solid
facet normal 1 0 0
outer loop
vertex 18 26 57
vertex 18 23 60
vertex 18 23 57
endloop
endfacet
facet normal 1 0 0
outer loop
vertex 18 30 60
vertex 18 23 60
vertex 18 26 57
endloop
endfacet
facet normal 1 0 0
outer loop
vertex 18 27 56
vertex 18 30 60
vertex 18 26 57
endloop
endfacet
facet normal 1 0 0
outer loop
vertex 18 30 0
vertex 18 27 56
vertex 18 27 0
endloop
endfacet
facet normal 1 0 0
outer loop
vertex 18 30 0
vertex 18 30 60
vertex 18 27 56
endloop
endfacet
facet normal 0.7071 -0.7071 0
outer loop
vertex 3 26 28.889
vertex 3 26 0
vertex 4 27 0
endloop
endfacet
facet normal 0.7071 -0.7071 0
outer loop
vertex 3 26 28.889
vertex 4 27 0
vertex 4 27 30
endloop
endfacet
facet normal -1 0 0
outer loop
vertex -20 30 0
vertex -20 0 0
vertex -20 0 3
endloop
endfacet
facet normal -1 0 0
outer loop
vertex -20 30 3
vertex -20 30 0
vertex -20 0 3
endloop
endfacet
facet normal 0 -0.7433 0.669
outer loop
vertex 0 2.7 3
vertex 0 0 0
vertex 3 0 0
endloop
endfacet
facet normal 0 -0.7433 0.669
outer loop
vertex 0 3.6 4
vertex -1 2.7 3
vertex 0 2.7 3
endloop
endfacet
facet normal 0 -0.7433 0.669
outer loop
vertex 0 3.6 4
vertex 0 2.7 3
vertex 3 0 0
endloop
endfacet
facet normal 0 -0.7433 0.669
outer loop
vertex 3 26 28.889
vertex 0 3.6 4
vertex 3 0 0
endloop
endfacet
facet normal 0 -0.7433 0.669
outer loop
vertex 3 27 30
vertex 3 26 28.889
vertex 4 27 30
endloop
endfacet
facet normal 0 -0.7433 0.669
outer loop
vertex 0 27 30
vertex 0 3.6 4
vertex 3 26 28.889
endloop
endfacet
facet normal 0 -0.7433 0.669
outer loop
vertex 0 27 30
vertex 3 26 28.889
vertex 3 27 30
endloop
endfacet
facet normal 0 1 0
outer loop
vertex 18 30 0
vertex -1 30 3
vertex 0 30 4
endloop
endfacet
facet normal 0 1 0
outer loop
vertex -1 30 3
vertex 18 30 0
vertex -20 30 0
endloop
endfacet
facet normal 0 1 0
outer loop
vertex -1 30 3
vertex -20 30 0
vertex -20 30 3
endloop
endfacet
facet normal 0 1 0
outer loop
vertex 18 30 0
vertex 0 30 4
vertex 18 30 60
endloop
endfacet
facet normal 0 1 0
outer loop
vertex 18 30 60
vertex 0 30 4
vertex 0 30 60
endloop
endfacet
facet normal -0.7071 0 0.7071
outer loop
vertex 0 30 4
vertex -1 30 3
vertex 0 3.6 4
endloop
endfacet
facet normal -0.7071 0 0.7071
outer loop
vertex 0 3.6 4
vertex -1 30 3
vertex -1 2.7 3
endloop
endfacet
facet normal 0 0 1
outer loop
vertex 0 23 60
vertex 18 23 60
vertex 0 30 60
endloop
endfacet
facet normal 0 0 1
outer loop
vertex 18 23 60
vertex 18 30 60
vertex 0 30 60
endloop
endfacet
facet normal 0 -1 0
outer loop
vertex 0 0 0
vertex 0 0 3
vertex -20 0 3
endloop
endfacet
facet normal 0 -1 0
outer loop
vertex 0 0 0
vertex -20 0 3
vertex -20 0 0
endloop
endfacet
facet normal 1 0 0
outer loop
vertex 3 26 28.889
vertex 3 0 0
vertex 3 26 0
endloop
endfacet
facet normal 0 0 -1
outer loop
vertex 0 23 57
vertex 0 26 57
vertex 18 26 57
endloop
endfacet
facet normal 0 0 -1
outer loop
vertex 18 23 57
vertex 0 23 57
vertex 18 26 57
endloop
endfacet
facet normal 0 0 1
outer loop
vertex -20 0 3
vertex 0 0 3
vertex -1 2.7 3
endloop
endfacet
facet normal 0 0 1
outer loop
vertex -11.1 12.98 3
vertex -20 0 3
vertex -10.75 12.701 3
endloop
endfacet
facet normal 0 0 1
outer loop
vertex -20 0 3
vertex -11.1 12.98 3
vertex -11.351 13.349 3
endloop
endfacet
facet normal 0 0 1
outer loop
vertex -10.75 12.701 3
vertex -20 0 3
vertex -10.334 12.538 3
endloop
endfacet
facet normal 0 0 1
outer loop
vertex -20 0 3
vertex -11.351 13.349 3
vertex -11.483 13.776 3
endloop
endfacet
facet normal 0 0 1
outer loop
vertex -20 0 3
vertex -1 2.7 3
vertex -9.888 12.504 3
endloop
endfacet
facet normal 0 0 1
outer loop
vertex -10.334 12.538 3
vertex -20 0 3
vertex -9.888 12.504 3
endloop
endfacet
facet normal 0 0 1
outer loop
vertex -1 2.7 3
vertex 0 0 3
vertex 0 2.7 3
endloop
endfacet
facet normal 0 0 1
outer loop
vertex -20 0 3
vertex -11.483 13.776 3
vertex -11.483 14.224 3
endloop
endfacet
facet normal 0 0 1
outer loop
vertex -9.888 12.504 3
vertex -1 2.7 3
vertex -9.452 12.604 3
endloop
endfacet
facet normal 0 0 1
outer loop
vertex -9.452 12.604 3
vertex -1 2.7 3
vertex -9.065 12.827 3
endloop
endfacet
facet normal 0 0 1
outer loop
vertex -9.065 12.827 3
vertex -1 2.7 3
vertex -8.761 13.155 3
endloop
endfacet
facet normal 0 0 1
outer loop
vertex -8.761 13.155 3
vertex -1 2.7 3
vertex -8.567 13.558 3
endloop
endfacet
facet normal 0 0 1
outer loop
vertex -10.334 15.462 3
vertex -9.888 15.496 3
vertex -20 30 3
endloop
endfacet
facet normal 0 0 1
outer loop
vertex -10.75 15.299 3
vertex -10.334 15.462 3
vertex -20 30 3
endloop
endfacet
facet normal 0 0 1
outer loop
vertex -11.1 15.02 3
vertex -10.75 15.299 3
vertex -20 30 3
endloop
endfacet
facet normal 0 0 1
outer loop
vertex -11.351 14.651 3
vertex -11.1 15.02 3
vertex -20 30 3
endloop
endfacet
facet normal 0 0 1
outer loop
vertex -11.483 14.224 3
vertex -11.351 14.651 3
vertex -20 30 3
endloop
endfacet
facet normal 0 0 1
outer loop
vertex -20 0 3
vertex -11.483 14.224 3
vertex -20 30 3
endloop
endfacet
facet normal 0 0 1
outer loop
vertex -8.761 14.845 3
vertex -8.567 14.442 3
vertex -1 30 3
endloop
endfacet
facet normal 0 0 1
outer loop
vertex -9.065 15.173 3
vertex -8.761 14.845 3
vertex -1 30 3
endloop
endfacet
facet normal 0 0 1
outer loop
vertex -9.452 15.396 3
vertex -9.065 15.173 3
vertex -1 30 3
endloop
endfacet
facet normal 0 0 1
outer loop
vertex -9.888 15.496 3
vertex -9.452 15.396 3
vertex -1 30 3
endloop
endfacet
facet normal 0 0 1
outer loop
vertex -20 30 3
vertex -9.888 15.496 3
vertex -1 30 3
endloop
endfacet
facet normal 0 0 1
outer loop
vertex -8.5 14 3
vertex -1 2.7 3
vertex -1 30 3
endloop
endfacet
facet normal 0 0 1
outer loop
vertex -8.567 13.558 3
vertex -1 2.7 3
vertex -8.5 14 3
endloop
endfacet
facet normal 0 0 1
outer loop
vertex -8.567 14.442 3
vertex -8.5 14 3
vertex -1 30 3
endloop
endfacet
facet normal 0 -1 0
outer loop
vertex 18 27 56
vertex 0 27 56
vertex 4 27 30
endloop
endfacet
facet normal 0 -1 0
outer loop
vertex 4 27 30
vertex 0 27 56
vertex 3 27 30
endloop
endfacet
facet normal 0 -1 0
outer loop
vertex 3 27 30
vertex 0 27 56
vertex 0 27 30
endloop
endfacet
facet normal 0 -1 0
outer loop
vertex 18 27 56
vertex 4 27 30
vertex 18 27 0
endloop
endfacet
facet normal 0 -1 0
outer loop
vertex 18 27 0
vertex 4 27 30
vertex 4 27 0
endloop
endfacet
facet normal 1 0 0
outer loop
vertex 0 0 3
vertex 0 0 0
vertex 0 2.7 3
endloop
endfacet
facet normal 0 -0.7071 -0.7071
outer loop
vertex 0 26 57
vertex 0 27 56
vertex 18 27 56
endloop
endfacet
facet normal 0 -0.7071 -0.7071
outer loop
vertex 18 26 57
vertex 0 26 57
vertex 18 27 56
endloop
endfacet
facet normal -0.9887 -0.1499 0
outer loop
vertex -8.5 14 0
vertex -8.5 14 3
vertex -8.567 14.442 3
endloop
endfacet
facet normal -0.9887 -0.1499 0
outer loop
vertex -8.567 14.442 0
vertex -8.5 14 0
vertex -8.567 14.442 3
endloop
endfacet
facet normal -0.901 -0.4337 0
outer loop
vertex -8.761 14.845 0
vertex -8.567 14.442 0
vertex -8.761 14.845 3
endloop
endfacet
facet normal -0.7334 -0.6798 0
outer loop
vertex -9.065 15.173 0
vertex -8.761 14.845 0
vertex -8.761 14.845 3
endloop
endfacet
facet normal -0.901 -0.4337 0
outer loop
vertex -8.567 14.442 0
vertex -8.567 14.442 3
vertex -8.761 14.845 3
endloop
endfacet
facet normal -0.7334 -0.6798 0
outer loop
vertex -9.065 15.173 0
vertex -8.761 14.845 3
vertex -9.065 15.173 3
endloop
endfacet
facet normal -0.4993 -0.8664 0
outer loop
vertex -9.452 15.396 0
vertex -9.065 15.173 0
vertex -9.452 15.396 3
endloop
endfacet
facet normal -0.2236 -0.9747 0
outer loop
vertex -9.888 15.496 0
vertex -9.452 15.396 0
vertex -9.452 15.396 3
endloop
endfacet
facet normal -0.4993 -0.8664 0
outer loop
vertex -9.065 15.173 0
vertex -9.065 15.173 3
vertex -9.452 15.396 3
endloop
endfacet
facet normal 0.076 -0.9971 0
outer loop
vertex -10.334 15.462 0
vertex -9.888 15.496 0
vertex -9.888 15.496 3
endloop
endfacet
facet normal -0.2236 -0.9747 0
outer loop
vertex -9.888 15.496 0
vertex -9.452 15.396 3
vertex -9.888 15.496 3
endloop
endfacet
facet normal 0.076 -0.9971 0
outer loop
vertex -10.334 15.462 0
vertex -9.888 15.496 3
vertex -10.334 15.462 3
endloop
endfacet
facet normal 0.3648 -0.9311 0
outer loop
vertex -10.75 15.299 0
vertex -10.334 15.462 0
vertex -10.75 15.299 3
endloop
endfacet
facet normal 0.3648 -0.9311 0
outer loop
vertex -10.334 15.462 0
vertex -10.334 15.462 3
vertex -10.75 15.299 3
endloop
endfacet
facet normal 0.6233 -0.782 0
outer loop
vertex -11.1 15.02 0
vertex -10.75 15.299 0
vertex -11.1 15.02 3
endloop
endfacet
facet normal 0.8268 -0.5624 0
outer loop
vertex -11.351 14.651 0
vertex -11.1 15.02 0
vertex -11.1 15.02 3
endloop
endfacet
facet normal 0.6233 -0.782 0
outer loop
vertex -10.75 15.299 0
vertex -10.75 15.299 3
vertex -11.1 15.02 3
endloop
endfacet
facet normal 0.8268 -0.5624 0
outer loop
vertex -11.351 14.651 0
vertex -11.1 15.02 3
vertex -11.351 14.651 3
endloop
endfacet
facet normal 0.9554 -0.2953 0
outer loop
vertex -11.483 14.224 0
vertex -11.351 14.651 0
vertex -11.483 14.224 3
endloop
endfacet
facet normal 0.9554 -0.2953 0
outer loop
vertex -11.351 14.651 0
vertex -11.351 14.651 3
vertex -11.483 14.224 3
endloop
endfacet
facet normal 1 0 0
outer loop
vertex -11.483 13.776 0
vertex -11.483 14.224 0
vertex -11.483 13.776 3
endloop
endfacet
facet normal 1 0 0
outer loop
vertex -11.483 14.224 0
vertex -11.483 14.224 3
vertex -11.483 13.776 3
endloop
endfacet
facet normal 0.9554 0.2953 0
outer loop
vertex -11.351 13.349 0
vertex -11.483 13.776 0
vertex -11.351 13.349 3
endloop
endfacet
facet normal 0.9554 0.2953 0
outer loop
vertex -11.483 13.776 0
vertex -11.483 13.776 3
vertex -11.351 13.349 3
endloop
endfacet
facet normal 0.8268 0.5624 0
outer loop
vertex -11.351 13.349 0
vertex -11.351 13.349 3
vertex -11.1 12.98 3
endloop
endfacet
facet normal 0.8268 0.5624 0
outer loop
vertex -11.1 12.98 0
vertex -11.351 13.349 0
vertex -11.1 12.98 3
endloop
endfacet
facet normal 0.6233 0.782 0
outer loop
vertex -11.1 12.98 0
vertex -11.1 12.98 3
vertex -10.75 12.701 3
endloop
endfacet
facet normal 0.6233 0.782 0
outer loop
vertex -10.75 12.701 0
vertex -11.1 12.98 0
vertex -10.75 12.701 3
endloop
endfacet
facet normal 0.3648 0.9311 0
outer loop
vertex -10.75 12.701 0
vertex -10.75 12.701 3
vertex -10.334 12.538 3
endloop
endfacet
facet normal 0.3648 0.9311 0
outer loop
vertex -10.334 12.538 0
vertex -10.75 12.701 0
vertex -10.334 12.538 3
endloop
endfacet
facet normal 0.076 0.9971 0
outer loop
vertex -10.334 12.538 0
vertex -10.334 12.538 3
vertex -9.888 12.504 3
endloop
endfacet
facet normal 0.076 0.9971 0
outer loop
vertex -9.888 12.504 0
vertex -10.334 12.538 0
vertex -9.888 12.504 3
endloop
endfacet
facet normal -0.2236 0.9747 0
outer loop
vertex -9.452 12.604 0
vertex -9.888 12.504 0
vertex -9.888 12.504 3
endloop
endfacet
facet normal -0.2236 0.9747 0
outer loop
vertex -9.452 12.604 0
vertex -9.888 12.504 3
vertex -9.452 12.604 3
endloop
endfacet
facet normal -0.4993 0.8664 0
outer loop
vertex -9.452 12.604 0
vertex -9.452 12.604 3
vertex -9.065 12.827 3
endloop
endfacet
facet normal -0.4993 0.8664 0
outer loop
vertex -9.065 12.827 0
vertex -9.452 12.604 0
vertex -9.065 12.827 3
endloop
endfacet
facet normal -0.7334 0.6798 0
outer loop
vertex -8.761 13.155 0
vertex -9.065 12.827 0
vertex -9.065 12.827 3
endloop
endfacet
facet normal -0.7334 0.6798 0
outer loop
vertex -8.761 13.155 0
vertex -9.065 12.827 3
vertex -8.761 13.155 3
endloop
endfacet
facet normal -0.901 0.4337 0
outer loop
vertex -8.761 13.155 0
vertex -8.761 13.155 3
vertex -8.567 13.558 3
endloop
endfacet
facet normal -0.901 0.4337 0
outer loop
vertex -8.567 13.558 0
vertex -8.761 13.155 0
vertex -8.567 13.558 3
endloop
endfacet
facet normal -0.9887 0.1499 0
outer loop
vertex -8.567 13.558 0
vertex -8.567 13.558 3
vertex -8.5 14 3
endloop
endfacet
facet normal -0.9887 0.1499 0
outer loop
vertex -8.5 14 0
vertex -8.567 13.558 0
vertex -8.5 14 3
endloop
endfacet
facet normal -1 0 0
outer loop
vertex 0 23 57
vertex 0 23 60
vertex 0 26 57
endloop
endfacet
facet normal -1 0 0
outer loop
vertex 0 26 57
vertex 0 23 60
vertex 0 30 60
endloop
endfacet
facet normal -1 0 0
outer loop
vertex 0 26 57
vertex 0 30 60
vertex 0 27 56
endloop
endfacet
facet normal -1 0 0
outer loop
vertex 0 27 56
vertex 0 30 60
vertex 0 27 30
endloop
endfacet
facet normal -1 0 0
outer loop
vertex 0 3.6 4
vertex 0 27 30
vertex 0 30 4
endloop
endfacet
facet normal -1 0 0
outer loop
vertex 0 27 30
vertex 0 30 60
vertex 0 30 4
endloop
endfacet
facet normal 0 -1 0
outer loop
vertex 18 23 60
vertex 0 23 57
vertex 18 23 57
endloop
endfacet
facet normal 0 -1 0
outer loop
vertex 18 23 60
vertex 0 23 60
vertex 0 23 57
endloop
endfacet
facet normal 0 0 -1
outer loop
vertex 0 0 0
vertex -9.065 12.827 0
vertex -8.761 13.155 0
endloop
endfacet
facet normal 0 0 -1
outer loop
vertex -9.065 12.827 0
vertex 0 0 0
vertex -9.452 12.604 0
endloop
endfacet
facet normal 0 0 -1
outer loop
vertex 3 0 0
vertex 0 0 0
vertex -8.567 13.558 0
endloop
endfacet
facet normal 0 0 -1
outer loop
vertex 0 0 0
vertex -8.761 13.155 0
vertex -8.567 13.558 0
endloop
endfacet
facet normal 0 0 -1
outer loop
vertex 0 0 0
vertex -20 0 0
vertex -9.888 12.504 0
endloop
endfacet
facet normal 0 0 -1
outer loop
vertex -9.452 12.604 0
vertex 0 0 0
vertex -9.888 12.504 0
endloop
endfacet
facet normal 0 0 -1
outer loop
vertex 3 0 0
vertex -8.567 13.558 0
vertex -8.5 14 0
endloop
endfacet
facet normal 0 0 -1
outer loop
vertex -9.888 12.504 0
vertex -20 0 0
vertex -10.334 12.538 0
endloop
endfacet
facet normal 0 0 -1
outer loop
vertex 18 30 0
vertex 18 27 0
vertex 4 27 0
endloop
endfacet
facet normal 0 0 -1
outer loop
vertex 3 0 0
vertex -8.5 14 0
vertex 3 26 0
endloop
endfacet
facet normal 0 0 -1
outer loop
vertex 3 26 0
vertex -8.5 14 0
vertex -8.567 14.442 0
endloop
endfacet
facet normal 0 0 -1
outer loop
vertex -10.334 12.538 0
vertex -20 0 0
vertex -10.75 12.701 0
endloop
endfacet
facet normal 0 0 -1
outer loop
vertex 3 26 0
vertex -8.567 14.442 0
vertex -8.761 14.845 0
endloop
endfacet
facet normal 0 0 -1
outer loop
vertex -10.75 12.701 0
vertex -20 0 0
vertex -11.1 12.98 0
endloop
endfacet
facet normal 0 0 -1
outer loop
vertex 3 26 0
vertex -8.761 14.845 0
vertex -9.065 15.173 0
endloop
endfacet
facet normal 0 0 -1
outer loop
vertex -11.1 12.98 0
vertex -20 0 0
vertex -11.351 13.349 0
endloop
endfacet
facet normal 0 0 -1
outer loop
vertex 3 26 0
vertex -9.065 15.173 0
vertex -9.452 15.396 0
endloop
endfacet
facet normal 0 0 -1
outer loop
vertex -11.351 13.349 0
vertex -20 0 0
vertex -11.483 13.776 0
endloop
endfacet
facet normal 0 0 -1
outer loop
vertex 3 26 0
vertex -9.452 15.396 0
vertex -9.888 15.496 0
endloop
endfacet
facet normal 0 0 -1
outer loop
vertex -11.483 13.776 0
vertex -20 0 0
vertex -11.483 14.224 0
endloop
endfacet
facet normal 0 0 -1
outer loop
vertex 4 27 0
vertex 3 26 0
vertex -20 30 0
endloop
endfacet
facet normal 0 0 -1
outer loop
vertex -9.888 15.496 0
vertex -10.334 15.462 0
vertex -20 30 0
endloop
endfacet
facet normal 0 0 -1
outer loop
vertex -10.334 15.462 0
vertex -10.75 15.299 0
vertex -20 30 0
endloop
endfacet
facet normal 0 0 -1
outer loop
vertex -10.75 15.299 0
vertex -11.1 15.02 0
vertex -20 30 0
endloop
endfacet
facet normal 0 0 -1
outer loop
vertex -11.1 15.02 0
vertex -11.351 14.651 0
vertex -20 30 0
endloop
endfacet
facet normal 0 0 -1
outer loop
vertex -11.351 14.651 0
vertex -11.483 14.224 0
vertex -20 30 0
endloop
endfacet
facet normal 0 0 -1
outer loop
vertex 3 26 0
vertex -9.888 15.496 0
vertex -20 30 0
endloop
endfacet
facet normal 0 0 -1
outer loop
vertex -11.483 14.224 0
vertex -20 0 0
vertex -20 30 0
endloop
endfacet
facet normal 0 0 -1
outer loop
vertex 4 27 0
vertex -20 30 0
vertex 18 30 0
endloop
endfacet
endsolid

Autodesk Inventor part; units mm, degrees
ref_plane "YZ Plane" through (0, 0, 0) normal (1, 0, 0) x (0, 1, 0)
ref_plane "XZ Plane" through (0, 0, 0) normal (0, 1, 0) x (-1, 0, 0)
ref_plane "XY Plane" through (0, 0, 0) normal (0, 0, 1) x (1, 0, 0)
sketch "Sketch1" plane through (0, 0, 0) normal (1, 0, 0) x (0, 1, 0)
  line L0 (0, 0) -> (30, 0)
  line L1 (30, 0) -> (30, 30)
  line L2 (30, 30) -> (0, 30)
  line L3 (0, 30) -> (0, 0)
  line L4 (0, 0) -> (27, 30)
  dimension "d0" = 30
  dimension "d1" = 30
  dimension "d24" = 3
extrude "Extrusion1" add sketch "Sketch1" along normal blind 3 contours L4 L2 L1 L0
sketch "Sketch2" plane through (0, 0, 0) normal (-1, 0, 0) x (0, 0, 1)
  line L0 (30, 0) -> (0, 0) projected
  line L1 (0, 0) -> (3, 0)
  line L2 (3, 0) -> (3, 30)
  line L3 (3, 30) -> (0, 30)
  line L4 (0, 30) -> (0, 0)
  line L5 (0, 30) -> (30, 30) projected
  dimension "d4" = 3
extrude "Extrusion2" add sketch "Sketch2" along normal blind 20
sketch "Sketch3" plane through (0, 0, 3) normal (0, 0, 1) x (1, 0, 0)
  circle A0 centre (-10, 14) radius 1.5
  line L0 (0, 30) -> (-20, 30) projected
  line L1 (0, 0) -> (-20, 0) projected
  line L2 (-20, 0) -> (-20, 30) projected
  line L3 (0, 30) -> (0, 0) projected
  dimension "d7" = 3
  dimension "d8" = 16
  dimension "d10" = 10
  dimension "d11" = 10
extrude "Extrusion3" cut sketch "Sketch3" against normal through all contours A0
sketch "Sketch4" plane through (3, 0, 0) normal (1, 0, 0) x (0, 0, -1)
  line L0 (0, 0) -> (0, 30) projected
  line L1 (0, 30) -> (-60, 30)
  line L2 (-60, 30) -> (-60, 27)
  line L3 (-60, 27) -> (0, 27)
  line L4 (0, 27) -> (0, 30)
  point P0 (0, 27)
  dimension "d17" = 3
  dimension "d18" = 60
extrude "Extrusion4" add sketch "Sketch4" along normal blind 15 and the other way blind 3
sketch "Sketch5" plane through (3, 27, 0) normal (0, -1, 0) x (1, 0, 0)
  line L0 (15, 60) -> (15, 0) projected
  line L1 (15, 60) -> (-3, 60)
  line L2 (-3, 60) -> (-3, 57)
  line L3 (-3, 57) -> (15, 57)
  line L4 (15, 57) -> (15, 60)
  line L5 (-3, 30) -> (-3, 60) projected
  point P0 (-3, 0)
  dimension "d21" = 3
extrude "Extrusion5" add sketch "Sketch5" along normal blind 4
chamfer "Chamfer1" distance 1 angle 45 3 edges at (3, 27, 15) (0, 16.35, 3) (9, 27, 57)
equation "\"d10\" = d11"
properties part number "inside bracket"
